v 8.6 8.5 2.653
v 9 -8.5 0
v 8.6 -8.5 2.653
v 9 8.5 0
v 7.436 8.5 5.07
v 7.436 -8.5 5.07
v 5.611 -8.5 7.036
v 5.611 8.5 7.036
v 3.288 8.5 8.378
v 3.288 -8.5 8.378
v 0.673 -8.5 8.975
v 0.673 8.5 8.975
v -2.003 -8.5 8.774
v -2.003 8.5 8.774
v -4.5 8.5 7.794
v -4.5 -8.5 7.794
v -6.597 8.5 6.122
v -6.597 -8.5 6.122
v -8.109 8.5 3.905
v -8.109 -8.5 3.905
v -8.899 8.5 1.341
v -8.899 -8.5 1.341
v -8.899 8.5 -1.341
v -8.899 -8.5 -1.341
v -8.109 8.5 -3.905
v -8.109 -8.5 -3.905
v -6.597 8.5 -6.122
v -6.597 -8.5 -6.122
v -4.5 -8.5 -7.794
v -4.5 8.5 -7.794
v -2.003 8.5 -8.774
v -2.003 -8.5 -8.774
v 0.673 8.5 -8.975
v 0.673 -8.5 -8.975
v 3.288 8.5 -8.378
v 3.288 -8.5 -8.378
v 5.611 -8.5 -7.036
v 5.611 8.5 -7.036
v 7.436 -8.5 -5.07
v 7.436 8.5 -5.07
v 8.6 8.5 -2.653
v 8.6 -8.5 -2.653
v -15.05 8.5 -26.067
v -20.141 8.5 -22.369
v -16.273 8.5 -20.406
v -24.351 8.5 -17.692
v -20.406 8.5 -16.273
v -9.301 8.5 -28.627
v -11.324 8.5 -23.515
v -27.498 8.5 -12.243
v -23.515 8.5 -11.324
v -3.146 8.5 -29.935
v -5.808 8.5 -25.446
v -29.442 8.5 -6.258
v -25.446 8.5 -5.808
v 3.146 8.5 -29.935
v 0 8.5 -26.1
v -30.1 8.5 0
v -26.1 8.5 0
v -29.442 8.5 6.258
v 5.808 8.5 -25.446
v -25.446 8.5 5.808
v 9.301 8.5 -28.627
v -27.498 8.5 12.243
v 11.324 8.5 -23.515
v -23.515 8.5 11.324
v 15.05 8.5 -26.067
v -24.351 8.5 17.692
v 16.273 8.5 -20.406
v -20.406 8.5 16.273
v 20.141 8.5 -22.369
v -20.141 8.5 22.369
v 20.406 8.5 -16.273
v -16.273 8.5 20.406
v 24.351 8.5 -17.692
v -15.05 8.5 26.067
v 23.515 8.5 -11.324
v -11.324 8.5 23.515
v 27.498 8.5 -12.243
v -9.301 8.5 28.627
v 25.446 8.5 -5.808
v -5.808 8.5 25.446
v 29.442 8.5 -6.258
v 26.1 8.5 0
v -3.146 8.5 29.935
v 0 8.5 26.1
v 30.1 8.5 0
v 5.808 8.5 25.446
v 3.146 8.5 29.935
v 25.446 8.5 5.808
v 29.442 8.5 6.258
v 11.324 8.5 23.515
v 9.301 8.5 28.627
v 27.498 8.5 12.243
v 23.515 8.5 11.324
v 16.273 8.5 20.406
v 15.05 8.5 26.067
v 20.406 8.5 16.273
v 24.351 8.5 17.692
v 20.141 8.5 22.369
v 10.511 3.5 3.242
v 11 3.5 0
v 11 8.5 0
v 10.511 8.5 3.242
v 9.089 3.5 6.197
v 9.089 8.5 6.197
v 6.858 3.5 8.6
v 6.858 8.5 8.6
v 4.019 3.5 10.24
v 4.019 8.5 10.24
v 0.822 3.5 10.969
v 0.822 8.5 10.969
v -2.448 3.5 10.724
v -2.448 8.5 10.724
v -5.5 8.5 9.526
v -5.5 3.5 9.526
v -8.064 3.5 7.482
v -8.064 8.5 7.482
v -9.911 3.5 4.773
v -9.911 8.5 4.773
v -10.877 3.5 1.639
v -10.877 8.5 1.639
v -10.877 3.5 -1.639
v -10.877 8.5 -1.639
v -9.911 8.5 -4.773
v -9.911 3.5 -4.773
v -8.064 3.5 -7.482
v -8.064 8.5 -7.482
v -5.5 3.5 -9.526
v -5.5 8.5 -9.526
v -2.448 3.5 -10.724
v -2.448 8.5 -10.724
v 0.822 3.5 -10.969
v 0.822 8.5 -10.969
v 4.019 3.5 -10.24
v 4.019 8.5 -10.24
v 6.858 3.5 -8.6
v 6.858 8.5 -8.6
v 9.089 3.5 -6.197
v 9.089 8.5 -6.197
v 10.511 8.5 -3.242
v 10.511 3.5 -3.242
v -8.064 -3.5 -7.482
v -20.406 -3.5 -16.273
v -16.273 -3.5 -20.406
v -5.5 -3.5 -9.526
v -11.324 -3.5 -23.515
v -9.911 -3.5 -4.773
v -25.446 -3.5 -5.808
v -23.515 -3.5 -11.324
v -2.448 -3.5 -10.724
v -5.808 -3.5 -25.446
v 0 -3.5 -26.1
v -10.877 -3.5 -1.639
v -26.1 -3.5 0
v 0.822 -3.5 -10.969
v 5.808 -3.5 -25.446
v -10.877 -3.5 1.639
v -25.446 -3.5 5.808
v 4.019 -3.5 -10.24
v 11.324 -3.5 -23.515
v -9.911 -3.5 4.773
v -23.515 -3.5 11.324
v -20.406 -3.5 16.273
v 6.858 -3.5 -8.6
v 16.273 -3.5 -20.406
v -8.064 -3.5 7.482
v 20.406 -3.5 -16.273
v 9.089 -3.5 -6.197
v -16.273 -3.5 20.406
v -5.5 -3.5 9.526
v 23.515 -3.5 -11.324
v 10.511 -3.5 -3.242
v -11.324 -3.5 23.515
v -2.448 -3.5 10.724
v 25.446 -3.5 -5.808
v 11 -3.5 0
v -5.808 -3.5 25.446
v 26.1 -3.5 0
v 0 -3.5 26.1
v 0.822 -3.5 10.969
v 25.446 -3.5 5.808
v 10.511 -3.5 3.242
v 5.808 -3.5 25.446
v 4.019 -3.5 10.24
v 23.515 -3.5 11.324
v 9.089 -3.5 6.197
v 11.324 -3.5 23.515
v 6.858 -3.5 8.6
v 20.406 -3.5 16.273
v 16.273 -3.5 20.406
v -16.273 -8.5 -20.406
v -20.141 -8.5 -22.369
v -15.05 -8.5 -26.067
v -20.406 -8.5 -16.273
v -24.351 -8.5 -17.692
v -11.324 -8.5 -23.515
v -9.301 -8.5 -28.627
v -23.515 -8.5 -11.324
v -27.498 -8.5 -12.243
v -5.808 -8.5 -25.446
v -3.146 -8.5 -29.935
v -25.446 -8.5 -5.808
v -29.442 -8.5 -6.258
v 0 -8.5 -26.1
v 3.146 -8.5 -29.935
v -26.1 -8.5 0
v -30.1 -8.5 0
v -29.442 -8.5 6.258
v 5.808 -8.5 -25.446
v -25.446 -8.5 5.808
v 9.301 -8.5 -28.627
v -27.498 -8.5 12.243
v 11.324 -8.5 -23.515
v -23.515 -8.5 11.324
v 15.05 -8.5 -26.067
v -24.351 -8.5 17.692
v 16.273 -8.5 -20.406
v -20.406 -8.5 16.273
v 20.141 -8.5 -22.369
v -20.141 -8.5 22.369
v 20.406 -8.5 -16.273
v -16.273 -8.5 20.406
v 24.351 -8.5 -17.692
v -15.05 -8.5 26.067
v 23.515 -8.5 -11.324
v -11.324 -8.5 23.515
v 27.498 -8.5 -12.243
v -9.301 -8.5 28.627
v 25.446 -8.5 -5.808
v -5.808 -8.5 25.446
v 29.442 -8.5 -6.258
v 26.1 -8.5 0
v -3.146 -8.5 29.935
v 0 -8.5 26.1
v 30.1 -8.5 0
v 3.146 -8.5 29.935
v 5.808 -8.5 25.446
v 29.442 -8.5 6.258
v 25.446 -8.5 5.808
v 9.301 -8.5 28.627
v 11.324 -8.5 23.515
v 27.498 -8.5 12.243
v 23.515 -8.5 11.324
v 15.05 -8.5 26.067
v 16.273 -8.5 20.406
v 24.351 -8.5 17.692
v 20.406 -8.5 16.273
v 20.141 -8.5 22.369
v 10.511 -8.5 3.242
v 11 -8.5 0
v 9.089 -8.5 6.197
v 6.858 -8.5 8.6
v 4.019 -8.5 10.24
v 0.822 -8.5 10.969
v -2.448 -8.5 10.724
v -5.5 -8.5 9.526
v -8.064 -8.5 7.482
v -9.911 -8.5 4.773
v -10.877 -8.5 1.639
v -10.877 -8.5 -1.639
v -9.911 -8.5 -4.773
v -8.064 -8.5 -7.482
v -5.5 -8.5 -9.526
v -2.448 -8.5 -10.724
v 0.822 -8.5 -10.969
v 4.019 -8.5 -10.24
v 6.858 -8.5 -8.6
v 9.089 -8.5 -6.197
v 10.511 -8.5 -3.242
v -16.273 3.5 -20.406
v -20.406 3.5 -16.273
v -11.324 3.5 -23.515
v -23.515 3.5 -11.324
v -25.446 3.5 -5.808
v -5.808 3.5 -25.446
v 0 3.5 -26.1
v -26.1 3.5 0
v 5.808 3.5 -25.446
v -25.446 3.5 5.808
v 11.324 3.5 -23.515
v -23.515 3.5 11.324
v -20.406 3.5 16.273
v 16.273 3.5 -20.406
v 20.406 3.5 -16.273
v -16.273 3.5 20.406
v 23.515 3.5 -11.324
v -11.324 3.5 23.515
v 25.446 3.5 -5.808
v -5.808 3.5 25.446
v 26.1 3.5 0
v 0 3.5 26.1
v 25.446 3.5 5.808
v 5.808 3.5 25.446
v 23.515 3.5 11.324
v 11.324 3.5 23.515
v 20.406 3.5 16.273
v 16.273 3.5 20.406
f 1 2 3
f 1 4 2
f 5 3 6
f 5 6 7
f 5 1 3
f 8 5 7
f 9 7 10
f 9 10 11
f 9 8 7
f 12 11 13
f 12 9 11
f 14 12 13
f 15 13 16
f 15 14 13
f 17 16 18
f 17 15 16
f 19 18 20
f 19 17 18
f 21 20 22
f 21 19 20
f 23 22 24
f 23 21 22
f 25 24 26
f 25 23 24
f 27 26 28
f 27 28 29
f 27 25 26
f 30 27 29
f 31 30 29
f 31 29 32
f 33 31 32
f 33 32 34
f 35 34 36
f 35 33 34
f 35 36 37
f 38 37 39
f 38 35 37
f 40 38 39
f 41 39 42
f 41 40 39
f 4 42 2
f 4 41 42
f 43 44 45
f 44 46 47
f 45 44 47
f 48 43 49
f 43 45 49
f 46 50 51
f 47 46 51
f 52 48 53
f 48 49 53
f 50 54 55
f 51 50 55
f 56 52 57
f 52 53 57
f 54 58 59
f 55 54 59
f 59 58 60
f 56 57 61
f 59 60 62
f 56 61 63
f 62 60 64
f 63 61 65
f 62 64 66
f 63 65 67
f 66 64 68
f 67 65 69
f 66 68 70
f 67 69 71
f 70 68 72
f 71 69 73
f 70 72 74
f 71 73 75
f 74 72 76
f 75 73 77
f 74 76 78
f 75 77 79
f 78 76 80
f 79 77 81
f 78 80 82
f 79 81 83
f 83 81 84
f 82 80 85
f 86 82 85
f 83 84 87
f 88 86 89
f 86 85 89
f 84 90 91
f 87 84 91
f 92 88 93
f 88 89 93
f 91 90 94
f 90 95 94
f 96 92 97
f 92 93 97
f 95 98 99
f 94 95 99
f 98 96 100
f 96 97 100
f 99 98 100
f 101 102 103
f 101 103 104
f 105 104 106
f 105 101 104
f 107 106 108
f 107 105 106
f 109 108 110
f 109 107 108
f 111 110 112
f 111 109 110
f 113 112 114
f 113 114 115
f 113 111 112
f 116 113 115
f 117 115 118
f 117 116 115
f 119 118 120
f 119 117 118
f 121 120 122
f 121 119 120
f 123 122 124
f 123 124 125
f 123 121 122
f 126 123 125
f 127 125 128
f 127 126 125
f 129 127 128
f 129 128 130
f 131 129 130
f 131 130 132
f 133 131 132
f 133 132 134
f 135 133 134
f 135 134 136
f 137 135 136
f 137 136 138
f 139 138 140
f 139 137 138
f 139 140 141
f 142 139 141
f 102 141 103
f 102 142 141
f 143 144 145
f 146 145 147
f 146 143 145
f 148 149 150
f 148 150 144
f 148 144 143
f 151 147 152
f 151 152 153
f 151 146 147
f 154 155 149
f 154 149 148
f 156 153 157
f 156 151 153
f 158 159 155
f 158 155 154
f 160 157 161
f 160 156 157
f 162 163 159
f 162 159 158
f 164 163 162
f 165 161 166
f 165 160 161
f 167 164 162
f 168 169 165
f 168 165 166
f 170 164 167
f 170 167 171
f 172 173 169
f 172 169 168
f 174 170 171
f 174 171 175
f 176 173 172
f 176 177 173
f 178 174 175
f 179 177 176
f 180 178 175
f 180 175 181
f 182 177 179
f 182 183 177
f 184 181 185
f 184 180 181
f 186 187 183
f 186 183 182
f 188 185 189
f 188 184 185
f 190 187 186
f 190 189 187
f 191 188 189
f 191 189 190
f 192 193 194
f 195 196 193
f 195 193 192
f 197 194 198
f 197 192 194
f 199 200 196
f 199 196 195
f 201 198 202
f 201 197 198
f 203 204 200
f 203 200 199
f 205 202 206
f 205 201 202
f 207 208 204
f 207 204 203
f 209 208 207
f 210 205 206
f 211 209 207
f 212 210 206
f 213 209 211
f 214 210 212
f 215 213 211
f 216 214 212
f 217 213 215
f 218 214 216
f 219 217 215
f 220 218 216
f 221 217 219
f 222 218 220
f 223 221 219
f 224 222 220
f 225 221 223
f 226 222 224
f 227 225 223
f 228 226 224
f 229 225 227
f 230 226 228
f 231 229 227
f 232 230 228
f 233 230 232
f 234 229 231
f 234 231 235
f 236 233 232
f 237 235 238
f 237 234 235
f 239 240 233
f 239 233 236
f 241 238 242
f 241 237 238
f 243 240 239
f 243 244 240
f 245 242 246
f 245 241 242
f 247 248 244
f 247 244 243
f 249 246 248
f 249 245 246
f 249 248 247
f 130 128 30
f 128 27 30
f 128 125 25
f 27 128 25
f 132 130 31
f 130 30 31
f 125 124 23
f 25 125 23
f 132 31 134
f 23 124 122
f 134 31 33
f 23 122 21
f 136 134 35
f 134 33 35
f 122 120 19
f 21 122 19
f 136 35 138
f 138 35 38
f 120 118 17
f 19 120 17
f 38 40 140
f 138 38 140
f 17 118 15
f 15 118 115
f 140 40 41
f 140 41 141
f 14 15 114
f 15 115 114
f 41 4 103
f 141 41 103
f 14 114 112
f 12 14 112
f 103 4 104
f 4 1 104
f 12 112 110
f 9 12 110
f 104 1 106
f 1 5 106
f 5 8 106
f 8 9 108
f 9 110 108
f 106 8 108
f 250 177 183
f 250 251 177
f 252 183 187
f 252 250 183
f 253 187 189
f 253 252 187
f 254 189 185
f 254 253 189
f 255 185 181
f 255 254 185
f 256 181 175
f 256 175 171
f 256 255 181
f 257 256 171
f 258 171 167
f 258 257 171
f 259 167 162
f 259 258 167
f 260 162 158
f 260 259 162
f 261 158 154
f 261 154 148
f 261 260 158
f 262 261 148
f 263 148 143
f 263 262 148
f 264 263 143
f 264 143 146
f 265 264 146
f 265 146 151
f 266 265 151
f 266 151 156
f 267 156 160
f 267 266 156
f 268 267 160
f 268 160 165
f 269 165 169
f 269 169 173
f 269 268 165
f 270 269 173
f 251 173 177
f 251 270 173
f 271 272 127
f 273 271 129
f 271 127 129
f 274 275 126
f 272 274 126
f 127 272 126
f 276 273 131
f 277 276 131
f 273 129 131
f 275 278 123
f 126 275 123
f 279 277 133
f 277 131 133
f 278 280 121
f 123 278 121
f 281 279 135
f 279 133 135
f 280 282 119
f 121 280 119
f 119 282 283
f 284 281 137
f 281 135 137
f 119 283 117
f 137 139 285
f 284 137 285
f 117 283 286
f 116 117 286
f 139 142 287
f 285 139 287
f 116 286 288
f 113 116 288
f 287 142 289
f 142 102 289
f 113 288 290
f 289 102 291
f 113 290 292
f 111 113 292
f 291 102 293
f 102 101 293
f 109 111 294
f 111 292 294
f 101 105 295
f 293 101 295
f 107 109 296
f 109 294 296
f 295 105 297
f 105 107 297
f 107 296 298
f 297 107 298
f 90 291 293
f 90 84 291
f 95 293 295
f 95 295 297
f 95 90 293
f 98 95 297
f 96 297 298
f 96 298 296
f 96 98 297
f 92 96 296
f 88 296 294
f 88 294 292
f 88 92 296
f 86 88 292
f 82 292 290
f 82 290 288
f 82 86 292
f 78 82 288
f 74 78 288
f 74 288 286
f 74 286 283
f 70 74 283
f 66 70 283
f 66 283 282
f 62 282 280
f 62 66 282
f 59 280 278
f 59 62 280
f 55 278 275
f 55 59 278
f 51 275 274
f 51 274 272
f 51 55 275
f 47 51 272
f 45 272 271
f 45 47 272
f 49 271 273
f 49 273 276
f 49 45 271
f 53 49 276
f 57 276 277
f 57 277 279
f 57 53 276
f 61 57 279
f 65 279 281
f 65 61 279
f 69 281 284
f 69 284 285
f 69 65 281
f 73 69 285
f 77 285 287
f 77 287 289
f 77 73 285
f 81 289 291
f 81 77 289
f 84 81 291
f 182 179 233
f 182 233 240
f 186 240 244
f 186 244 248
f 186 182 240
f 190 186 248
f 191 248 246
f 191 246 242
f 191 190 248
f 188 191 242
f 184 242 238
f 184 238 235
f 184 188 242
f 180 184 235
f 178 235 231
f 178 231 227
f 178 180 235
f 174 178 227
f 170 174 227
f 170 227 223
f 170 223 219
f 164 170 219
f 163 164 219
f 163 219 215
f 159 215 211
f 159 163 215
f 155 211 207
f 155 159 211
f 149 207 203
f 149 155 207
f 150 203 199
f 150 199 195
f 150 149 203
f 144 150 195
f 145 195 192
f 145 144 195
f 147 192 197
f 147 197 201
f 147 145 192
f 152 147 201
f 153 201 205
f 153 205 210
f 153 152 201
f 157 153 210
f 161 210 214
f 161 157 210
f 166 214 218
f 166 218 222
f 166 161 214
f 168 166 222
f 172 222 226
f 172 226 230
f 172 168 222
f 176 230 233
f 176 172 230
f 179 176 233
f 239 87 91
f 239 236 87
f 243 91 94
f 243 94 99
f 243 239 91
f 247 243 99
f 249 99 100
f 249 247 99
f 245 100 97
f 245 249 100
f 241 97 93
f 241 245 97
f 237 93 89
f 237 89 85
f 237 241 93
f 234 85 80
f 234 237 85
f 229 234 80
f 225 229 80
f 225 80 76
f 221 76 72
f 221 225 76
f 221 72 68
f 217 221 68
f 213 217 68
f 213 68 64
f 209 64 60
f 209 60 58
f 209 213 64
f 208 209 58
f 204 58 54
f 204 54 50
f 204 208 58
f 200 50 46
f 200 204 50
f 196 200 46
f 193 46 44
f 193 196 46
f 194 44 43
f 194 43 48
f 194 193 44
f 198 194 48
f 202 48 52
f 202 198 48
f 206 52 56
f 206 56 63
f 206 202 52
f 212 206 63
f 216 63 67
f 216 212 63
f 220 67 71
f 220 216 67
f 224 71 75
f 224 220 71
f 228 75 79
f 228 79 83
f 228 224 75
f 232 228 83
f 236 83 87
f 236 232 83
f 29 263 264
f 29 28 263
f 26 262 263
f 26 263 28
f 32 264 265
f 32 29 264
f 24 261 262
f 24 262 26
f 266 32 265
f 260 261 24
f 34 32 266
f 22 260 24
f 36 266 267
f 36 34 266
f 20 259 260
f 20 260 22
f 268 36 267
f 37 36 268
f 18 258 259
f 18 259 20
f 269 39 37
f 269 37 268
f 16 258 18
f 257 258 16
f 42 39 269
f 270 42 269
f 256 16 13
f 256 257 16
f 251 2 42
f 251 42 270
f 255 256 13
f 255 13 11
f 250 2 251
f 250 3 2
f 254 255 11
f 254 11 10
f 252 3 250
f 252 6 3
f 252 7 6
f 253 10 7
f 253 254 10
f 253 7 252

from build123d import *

# Parameters (mm, degrees)
F0_R     = 11
F0_R_2   = 9
F1_DEPTH = 8.5
F0_R_3   = 26.1
F2_DEPTH = 3.5
F0_R_4   = 30.1
F3_DEPTH = 8.5


with BuildPart() as f1:
    # F0 (on Front) → F1 (new body, symmetric)
    with BuildSketch(Plane.XZ):
        Circle(F0_R)
        Circle(F0_R_2, mode=Mode.SUBTRACT)
    extrude(amount=F1_DEPTH, both=True)

    # F0 (on Front) → F2 (join, symmetric)
    with BuildSketch(Plane.XZ):
        Circle(F0_R_3)
        Circle(F0_R, mode=Mode.SUBTRACT)
    extrude(amount=F2_DEPTH, both=True)

    # F0 (on Front) → F3 (join, symmetric)
    with BuildSketch(Plane.XZ):
        Circle(F0_R_4)
        Circle(F0_R_3, mode=Mode.SUBTRACT)
    extrude(amount=F3_DEPTH, both=True)


solid = f1.part
